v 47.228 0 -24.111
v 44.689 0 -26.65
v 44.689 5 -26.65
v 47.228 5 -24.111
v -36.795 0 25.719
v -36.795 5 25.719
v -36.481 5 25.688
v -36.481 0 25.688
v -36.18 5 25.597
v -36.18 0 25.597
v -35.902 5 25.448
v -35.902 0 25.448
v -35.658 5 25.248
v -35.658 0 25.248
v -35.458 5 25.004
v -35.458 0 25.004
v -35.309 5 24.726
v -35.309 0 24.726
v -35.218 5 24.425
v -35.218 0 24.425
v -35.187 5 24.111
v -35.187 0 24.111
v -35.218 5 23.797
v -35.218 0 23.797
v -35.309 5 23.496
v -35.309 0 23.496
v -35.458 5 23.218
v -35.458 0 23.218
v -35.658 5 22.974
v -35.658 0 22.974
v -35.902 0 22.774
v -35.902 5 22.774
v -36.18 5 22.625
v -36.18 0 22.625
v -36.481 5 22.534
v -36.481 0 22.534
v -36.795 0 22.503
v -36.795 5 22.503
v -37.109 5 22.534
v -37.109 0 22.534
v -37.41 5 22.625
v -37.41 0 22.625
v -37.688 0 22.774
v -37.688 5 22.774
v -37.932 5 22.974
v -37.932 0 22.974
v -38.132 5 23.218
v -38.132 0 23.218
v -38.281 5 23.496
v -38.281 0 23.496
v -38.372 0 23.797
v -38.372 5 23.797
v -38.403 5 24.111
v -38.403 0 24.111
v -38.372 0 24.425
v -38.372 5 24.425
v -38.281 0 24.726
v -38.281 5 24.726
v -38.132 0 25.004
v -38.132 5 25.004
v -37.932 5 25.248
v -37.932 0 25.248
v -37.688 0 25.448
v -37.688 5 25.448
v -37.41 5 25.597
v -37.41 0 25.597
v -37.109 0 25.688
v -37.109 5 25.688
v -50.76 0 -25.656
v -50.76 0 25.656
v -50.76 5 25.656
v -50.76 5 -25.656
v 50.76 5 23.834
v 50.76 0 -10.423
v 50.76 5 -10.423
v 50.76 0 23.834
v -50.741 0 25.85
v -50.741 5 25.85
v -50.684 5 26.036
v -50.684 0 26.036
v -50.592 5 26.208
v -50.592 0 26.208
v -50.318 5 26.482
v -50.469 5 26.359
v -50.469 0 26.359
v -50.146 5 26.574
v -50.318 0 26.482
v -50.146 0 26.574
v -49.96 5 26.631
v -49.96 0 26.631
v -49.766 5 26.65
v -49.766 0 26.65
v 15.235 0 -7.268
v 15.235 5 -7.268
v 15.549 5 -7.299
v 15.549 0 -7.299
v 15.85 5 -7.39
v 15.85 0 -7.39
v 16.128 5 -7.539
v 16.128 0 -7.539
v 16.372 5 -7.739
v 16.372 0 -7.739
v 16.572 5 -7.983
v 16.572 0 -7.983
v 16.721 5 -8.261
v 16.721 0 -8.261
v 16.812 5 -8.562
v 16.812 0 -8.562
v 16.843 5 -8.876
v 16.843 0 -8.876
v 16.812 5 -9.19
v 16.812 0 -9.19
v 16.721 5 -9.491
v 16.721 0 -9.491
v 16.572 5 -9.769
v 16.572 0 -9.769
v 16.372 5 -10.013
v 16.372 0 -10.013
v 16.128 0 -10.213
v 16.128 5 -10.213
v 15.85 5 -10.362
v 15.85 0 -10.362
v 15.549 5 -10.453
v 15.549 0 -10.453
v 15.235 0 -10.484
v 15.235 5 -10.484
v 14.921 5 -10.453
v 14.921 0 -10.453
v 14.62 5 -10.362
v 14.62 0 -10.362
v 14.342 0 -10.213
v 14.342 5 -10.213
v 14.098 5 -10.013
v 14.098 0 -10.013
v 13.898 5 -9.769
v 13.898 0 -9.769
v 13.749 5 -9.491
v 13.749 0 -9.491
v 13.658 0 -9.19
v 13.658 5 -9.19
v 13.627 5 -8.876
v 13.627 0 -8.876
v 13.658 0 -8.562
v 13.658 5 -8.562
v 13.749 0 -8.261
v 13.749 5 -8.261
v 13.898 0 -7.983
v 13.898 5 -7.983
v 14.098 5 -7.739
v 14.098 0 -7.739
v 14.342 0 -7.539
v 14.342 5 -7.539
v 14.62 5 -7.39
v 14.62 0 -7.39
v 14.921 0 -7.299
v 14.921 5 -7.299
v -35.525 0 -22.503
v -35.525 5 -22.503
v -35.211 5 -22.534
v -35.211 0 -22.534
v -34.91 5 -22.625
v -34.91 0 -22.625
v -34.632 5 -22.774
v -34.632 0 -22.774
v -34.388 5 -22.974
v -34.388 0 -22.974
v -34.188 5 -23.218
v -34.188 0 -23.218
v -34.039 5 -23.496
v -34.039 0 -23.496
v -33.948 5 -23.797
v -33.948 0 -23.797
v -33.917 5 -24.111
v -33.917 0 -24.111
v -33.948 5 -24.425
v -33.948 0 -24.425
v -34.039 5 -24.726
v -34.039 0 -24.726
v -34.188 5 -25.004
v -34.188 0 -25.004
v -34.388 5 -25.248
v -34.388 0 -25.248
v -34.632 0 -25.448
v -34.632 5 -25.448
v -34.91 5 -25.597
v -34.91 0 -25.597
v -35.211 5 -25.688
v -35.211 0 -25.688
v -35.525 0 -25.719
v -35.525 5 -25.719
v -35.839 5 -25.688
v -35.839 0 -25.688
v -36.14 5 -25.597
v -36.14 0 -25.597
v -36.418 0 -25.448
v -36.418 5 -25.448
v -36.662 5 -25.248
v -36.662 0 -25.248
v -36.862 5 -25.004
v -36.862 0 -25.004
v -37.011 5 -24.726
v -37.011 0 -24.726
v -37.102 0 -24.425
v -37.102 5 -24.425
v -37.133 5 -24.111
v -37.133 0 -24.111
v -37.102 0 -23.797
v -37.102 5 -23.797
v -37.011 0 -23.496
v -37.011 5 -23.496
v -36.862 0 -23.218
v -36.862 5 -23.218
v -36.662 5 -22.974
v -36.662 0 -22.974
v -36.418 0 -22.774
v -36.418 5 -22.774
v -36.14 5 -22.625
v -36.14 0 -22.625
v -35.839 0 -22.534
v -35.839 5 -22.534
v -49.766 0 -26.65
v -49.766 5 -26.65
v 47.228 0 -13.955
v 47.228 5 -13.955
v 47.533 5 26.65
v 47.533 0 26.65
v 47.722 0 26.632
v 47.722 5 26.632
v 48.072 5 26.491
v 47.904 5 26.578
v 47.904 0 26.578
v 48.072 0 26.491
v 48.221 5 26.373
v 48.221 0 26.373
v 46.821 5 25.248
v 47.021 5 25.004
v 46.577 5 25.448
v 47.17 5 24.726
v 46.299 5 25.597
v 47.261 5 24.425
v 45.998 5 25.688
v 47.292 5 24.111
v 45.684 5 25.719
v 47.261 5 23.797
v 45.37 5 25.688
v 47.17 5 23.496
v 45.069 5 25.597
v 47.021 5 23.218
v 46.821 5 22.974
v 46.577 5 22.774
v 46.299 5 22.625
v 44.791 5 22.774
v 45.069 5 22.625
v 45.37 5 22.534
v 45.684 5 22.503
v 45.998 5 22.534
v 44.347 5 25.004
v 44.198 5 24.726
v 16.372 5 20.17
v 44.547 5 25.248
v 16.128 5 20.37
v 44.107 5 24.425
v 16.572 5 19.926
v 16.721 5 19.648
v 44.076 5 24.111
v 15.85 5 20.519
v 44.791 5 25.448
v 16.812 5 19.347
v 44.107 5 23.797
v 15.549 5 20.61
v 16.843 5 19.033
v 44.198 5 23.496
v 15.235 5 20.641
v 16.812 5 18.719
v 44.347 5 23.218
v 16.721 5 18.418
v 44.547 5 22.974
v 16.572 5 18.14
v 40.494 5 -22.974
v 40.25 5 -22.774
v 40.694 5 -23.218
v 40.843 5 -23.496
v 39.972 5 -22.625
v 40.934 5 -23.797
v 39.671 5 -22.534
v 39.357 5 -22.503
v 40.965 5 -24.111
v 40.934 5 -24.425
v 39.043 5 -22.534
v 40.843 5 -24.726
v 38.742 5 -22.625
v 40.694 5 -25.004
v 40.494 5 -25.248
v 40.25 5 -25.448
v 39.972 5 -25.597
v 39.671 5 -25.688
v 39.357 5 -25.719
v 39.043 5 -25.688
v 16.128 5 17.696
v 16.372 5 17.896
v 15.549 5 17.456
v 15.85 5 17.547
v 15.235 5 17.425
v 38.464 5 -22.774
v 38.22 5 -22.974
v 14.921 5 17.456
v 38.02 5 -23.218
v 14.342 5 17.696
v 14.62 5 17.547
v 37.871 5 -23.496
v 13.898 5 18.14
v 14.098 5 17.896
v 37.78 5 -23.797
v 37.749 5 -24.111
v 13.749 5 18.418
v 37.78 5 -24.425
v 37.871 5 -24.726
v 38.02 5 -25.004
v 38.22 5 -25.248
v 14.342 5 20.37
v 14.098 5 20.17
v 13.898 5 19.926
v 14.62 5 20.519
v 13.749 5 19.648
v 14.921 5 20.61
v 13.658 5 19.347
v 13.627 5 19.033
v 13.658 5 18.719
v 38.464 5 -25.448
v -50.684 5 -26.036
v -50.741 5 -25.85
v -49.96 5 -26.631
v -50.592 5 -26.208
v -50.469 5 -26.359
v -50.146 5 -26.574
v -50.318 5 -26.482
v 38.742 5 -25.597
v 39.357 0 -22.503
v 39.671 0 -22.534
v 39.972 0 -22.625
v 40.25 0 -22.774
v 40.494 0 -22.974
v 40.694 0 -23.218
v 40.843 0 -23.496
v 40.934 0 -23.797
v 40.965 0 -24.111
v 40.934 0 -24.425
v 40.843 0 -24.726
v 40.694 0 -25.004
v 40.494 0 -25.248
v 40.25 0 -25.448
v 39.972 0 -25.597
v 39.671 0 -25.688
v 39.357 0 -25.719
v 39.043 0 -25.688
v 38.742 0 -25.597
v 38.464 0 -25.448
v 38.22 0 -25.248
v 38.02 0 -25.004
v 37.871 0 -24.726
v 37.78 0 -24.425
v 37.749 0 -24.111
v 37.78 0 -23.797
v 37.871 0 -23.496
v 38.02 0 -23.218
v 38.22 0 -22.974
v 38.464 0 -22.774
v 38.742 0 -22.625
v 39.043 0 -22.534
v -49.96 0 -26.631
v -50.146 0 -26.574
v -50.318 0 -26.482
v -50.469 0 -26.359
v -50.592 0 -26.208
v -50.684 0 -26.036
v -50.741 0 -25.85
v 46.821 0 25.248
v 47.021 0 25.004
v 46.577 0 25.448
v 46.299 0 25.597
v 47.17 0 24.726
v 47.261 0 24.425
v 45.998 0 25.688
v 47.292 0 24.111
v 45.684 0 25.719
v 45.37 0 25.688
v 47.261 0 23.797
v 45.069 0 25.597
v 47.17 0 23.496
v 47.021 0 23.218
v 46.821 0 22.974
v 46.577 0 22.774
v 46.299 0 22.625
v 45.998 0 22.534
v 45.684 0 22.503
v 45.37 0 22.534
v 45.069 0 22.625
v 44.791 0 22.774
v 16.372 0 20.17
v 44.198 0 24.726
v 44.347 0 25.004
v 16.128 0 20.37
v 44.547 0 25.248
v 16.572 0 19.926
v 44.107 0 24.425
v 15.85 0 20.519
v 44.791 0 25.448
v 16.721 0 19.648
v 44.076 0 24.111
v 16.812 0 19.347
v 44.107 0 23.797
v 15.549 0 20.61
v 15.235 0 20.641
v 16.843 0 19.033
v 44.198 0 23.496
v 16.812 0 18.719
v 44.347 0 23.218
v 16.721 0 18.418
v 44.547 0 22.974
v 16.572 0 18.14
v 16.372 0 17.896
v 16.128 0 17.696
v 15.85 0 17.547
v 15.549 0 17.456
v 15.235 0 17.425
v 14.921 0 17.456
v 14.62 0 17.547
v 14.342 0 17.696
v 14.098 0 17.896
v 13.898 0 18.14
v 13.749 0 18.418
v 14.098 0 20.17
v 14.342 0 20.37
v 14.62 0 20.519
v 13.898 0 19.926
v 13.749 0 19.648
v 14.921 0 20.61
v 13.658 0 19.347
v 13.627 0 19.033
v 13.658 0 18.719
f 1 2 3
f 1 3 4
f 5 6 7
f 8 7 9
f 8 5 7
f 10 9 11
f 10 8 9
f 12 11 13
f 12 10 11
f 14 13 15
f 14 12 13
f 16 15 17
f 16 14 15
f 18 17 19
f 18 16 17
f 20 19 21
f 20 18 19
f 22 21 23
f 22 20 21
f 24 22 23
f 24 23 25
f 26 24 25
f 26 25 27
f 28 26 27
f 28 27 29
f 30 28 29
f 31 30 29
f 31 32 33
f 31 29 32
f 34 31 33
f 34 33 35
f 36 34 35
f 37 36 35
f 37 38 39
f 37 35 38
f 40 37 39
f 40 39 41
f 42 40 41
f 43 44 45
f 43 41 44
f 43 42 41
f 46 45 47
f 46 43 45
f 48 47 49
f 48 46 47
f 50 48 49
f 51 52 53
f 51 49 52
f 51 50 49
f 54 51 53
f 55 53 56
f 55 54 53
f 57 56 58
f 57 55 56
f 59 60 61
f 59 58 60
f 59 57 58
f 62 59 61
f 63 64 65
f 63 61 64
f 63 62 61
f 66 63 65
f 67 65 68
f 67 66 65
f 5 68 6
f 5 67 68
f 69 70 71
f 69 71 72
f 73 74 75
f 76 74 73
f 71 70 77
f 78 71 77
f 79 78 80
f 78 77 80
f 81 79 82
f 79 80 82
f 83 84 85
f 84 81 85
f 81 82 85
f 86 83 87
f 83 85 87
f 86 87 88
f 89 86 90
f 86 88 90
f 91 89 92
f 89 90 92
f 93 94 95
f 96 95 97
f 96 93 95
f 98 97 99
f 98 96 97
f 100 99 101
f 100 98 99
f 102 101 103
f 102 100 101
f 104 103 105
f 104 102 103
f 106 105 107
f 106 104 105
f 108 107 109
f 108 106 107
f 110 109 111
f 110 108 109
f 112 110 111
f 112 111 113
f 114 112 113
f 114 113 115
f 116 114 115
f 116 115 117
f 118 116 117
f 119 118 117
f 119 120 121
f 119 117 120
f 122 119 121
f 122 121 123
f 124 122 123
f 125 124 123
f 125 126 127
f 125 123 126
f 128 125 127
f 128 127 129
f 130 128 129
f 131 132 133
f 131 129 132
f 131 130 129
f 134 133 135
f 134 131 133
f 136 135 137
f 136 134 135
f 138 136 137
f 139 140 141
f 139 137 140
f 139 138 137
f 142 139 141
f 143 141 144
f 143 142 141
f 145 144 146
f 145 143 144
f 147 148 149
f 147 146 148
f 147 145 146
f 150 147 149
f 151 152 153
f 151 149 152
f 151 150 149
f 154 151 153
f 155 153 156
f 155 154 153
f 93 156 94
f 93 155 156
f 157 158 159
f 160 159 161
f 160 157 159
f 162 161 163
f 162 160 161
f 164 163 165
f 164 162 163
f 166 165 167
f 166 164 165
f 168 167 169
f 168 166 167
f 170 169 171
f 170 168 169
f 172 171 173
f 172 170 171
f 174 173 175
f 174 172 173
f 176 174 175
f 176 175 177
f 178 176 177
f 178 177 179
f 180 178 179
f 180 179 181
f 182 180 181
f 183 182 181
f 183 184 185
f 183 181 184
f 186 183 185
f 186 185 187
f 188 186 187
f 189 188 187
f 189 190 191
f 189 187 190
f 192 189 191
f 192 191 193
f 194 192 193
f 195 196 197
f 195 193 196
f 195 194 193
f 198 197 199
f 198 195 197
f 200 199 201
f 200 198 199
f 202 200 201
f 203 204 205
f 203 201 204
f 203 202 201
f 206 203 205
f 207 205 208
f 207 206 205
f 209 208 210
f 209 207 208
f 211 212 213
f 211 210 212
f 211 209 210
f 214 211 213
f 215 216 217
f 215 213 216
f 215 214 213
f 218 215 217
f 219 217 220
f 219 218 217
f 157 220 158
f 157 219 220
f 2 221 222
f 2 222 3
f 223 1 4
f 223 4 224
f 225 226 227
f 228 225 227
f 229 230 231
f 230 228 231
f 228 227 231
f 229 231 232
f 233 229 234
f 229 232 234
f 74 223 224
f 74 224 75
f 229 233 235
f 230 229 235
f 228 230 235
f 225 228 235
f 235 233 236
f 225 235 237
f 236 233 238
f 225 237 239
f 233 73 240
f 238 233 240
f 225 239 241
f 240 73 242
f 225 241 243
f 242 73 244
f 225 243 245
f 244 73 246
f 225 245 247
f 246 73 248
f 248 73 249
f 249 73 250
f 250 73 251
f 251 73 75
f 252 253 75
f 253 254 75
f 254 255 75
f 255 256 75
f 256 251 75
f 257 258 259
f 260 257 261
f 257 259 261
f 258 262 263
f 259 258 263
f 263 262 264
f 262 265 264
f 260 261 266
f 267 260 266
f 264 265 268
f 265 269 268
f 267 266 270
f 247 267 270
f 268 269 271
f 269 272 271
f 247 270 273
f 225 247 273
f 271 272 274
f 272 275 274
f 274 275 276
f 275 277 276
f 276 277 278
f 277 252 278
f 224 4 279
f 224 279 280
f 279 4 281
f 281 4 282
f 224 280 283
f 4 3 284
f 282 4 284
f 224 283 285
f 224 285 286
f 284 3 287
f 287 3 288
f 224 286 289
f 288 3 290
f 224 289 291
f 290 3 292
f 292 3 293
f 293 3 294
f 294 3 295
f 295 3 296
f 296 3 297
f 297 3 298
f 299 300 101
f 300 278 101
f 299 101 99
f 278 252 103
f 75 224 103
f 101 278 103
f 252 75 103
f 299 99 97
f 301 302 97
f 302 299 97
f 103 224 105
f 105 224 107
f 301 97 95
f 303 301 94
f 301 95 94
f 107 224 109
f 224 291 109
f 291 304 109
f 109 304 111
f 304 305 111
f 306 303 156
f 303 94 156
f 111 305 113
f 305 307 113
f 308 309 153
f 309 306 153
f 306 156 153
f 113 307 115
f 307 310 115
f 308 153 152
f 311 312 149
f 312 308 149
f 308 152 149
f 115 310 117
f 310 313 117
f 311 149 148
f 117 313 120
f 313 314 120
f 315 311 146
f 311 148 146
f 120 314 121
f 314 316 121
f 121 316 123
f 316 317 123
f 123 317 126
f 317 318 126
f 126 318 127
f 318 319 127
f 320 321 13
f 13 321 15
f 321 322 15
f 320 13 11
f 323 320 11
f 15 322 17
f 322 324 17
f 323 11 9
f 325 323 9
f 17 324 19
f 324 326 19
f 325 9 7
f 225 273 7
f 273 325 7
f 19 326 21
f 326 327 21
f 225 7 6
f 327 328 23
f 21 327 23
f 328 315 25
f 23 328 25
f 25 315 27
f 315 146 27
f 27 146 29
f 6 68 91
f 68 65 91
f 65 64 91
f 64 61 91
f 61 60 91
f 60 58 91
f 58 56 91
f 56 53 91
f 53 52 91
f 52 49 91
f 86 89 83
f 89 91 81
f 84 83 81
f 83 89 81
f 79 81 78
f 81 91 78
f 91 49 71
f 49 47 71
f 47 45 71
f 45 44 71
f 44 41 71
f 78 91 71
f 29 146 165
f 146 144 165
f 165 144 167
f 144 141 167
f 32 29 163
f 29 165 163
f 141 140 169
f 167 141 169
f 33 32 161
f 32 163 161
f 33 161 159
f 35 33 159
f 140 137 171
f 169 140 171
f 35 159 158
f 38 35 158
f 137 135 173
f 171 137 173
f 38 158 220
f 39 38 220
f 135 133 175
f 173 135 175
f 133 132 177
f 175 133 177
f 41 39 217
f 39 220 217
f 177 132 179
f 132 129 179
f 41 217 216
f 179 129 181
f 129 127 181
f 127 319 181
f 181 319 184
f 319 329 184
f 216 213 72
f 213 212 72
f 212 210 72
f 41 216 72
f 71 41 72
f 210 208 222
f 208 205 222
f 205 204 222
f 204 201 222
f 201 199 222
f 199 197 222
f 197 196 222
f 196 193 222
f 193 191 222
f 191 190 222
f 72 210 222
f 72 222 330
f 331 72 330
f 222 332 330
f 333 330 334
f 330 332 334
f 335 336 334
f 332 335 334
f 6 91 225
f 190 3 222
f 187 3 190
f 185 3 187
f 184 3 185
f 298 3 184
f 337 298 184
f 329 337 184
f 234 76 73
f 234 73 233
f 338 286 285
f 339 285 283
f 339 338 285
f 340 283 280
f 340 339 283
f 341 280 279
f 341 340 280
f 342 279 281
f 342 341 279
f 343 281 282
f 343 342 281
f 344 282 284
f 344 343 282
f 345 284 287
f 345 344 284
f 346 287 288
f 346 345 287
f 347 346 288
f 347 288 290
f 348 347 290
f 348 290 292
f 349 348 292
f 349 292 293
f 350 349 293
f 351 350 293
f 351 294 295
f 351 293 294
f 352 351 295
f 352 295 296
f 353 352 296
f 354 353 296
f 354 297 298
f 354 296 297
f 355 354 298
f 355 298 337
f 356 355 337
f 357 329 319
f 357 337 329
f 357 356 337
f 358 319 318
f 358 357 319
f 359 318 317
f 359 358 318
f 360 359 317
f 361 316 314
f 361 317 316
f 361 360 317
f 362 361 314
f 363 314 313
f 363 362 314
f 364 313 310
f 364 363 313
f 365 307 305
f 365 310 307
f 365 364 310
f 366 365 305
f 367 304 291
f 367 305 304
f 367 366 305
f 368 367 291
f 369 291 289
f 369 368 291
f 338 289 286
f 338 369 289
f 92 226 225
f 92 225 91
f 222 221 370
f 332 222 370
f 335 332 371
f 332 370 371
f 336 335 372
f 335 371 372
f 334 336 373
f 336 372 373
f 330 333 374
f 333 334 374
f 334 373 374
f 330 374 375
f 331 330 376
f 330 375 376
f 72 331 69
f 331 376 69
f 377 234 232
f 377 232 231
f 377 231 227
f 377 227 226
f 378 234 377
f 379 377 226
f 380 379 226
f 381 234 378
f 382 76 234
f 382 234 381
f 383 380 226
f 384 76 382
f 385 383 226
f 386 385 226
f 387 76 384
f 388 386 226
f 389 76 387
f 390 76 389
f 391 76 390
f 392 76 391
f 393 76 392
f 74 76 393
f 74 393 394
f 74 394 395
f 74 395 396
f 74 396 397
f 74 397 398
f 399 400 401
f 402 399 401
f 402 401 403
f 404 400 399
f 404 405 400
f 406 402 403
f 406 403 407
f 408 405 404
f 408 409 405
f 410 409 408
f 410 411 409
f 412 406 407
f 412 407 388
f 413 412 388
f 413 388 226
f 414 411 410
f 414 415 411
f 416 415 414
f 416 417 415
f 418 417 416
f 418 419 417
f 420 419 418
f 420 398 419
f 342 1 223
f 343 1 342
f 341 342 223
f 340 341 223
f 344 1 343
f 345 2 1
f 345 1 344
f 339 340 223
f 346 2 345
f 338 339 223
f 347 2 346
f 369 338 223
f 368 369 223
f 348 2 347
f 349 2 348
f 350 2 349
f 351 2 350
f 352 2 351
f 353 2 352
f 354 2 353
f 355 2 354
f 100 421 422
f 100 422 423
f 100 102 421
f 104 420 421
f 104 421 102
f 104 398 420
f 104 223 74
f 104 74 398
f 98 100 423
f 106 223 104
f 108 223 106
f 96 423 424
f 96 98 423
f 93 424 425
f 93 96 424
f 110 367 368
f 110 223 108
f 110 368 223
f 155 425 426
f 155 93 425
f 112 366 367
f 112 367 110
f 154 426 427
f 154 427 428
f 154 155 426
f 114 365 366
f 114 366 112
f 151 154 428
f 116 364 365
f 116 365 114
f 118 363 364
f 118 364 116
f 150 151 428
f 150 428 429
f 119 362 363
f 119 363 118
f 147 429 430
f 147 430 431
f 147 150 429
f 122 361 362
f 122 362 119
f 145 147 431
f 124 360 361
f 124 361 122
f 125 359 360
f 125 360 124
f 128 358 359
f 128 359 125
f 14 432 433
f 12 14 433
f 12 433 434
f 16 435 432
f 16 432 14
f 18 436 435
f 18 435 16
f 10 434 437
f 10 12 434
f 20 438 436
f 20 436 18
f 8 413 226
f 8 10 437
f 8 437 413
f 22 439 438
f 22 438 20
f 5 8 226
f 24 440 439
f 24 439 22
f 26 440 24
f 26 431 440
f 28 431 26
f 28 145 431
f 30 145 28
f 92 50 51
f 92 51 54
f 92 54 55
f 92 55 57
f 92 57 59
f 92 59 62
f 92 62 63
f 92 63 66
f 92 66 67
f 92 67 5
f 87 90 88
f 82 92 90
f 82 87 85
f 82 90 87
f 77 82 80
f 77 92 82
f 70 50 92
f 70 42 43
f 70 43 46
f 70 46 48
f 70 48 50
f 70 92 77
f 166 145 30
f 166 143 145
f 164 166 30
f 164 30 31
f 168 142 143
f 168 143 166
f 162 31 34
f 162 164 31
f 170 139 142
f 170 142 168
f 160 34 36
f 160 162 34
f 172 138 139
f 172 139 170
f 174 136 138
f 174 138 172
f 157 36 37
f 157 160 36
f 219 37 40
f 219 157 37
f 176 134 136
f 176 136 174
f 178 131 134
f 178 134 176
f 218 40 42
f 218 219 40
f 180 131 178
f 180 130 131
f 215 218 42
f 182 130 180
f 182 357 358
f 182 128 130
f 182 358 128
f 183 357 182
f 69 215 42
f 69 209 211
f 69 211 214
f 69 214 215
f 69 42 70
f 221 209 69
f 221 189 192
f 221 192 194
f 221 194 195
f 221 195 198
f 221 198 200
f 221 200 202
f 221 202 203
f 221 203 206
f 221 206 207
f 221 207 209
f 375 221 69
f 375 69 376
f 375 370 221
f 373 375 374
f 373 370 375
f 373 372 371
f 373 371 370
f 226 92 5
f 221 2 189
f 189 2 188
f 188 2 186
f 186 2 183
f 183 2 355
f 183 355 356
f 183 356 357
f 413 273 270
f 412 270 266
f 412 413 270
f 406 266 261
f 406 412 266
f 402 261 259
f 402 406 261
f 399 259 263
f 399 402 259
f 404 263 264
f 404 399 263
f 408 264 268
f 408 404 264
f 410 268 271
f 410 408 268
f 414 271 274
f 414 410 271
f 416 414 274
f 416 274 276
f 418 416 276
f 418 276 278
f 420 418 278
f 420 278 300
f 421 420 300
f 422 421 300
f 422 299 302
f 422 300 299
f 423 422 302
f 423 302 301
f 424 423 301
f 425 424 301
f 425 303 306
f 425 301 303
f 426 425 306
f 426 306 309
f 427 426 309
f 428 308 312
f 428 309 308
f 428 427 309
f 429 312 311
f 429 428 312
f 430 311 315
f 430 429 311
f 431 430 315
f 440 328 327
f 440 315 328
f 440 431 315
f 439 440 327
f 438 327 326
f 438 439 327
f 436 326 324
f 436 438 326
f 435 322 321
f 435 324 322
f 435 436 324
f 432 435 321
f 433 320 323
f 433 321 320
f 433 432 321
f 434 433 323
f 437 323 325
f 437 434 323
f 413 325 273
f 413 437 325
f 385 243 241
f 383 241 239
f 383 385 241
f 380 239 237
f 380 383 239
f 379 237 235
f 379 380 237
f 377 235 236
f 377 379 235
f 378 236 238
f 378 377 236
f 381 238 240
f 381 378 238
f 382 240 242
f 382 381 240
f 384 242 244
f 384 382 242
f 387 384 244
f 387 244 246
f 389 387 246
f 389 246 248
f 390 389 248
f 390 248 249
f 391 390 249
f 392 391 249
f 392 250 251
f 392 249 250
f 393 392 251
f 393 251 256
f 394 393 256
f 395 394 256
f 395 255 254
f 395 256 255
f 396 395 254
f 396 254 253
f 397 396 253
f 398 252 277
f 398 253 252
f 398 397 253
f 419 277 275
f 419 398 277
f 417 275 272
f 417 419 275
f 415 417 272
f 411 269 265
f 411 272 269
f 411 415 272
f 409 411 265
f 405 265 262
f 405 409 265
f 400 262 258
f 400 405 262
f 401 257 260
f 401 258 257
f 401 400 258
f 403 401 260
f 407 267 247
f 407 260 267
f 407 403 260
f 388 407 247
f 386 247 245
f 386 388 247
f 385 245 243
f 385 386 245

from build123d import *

# Parameters (mm, degrees)
BOSS_EXTRUDE1_DEPTH = 5
SKETCH2_R           = 1.608
CUT_EXTRUDE1_DEPTH  = 58.548241502
FILLET1_R           = 0.994


with BuildPart() as part:
    # Sketch1 → Boss-Extrude1 (new body)
    with BuildSketch(Plane(origin=(0, 0, 0), x_dir=(1, 0, 0), z_dir=(0, 1, 0))):
        Polygon((-50.76, -26.65), (-50.76, 26.65), (44.689, 26.65), (47.228, 24.111), (47.228, 13.955), (50.76, 10.423), (50.76, -23.834), (48.221, -26.373), (48.221, -26.65), align=None)
    extrude(amount=BOSS_EXTRUDE1_DEPTH)

    # Sketch2 → Cut-Extrude1 (cut, through all)
    with BuildSketch(Plane(origin=(0, 0, 0), x_dir=(1, 0, 0), z_dir=(0, 1, 0))):
        with Locations(Location((-35.525, 24.111, 0), (0, 0, 270))):
            Circle(SKETCH2_R)
        with Locations(Location((-36.795, -24.111, 0), (0, 0, 270))):
            Circle(SKETCH2_R)
        with Locations(Location((15.235, 8.876, 0), (0, 0, 270))):
            Circle(SKETCH2_R)
        with Locations(Location((15.235, -19.033, 0), (0, 0, 270))):
            Circle(SKETCH2_R)
        with Locations(Location((39.357, 24.111, 0), (0, 0, 270))):
            Circle(SKETCH2_R)
        with Locations(Location((45.684, -24.111, 0), (0, 0, 270))):
            Circle(SKETCH2_R)
    extrude(amount=CUT_EXTRUDE1_DEPTH, mode=Mode.SUBTRACT)

    # Fillet1
    # the kernel refuses this fillet: 0.994 mm, written as the material it takes off along each edge
    with BuildSketch(Plane(origin=(48.221, -1.721095218, 26.65), x_dir=(-1, 0, 0), z_dir=(0, 1, 0))) as fillet1_piece_1:
        with BuildLine():
            CenterArc((0.688438087, -0.994), FILLET1_R, 90, 43.83577097)
            Line((0, -0.277), (-0.013768762, -0.26266))
            ThreePointArc((-0.013768762, -0.26266), (-0.01988, -0.1385), (-0.01988, 0))
            Line((-0.01988, 0), (0, 0.01988))
            Line((0, 0.01988), (0.688438087, 0.01988))
            Line((0.688438087, 0.01988), (0.688438087, 0))
        make_face()
    extrude(amount=8.442190436, mode=Mode.SUBTRACT)
    with BuildSketch(Plane(origin=(-50.76, -2.485, 26.65), x_dir=(0, 0, -1), z_dir=(0, 1, 0))) as fillet1_piece_2:
        with BuildLine():
            CenterArc((FILLET1_R, -FILLET1_R), FILLET1_R, 90, 90)
            Line((0, -FILLET1_R), (-FILLET1_R * 0.02, -FILLET1_R))
            Line((-FILLET1_R * 0.02, -FILLET1_R), (-FILLET1_R * 0.02, FILLET1_R * 0.02))
            Line((-FILLET1_R * 0.02, FILLET1_R * 0.02), (FILLET1_R, FILLET1_R * 0.02))
            Line((FILLET1_R, FILLET1_R * 0.02), (FILLET1_R, 0))
        make_face()
    extrude(amount=9.97, mode=Mode.SUBTRACT)
    with BuildSketch(Plane(origin=(-50.76, -2.485, -26.65), x_dir=(0, 0, 1), z_dir=(0, 1, 0))) as fillet1_piece_3:
        with BuildLine():
            CenterArc((FILLET1_R, FILLET1_R), FILLET1_R, 180, 90)
            Line((0, FILLET1_R), (-FILLET1_R * 0.02, FILLET1_R))
            Line((-FILLET1_R * 0.02, FILLET1_R), (-FILLET1_R * 0.02, -FILLET1_R * 0.02))
            Line((-FILLET1_R * 0.02, -FILLET1_R * 0.02), (FILLET1_R, -FILLET1_R * 0.02))
            Line((FILLET1_R, -FILLET1_R * 0.02), (FILLET1_R, 0))
        make_face()
    extrude(amount=9.97, mode=Mode.SUBTRACT)


solid = part.part
